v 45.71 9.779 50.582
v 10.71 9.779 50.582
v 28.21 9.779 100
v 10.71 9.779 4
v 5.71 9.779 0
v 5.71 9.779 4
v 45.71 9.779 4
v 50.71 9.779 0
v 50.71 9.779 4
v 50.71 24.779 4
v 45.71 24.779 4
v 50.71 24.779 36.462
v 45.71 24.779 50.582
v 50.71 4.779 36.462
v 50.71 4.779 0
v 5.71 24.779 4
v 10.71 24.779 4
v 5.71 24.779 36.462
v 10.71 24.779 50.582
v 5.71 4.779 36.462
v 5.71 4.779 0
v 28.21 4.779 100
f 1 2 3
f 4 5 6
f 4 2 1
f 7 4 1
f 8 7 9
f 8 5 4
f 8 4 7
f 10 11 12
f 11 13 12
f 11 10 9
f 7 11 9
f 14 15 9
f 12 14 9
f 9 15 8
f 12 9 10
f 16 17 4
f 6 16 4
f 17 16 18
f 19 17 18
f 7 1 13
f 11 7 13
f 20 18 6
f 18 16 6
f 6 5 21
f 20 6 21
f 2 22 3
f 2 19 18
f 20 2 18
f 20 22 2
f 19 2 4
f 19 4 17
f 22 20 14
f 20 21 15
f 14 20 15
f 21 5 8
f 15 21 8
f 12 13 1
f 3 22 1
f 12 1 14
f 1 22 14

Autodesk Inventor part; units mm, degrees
ref_plane "YZ Plane" through (0, 0, 0) normal (1, 0, 0) x (0, 1, 0)
ref_plane "XZ Plane" through (0, 0, 0) normal (0, 1, 0) x (-1, 0, 0)
ref_plane "XY Plane" through (0, 0, 0) normal (0, 0, 1) x (1, 0, 0)
sketch "Sketch1" plane through (0, 0, 0) normal (0, 0, 1) x (1, 0, 0)
  line L0 (10.7104, 9.7791) -> (45.7104, 9.7791)
  line L1 (45.7104, 9.7791) -> (45.7104, 24.7791)
  line L2 (10.7104, 9.7791) -> (10.7104, 24.7791)
  line L3 (5.7104, 24.7791) -> (5.7104, 4.7791)
  line L4 (5.7104, 4.7791) -> (50.7104, 4.7791)
  line L5 (50.7104, 4.7791) -> (50.7104, 24.7791)
  line L6 (5.7104, 24.7791) -> (10.7104, 24.7791)
  line L7 (45.7104, 24.7791) -> (50.7104, 24.7791)
  point P0 (0, 0)
  point P1 (28.2104, 9.7791)
  dimension "d0" = 35
  dimension "d1" = 15
  dimension "d2" = 15
  dimension "d29" = 5
extrude "Extrusion1" add sketch "Sketch1" along normal blind 100
sketch "Sketch3" plane through (10.7104, 9.7791, 0) normal (0, 1, 0) x (1, 0, 0)
  line L0 (-5, -100) -> (40, -100) projected
  line L1 (-5, 0) -> (-5, -100) projected
  line L2 (17.5, -100) -> (37.1919, -100) construction
  line L3 (-5, -85.7353) -> (-5, -100)
  line L4 (-5, -100) -> (17.5, -100)
  line L5 (40, 0) -> (40, -100) projected
  line L6 (17.5, -100) -> (37.1919, -100) construction
  line L7 (40, -85.7353) -> (40, -100)
  line L8 (40, -100) -> (17.5, -100)
  line L9 (40, 0) -> (40, -100) projected
  line L10 (17.5, -100) -> (-5, -36.462)
  line L11 (17.5, -100) -> (40, -36.462)
  line L12 (-5, -36.462) -> (40, -36.462)
  line L13 (35, 0) -> (35, -100) projected
  line L14 (0, 0) -> (0, -100) projected
  point P0 (-10.7104, 0)
  point P1 (-5, -77.7514)
  point P2 (40, -36.462)
  point P3 (-5, -60.8533)
  dimension "d33" = 39
extrude "Extrusion5" cut sketch "Sketch3" along normal through all both and the other way through all contours L1 L10 L14 L0 | L14 L10 L0 | L11 L13 L0 | L13 L11 L5 L0
sketch "Sketch4" plane through (50.7104, 4.7791, 0) normal (1, 0, 0) x (0, 0, -1)
  line L0 (0, 20) -> (-50.5815, 20) projected
  line L1 (0, 20) -> (-4, 20)
  line L2 (-4, 20) -> (-4, 5)
  line L3 (0, 5) -> (-50.5815, 5) projected
  line L4 (0, 20) -> (0, 5) projected
  line L5 (0, 5) -> (0, 20)
  line L6 (0, 20) -> (0, 5)
  line L7 (-4, 5) -> (0, 5)
  point P0 (0, -4.7791)
  dimension "d24" = 4
extrude "Extrusion6" cut sketch "Sketch4" against normal through all
equation "\"BendRadius\" = Thickness"
equation "\"BendReliefWidth\" = Thickness"
equation "\"BendReliefDepth\" = 0.5 * Thickness"
equation "\"CornerReliefSize\" = 4 * Thickness"
equation "\"MinimumRemnant\" = 2 * Thickness"
equation "\"TransitionRadius\" = BendRadius"
equation "\"JacobiRadiusSize\" = BendRadius"
equation "\"GapSize\" = Thickness"
equation "\"Thickness\" = 0.5"
properties part number "middleslide2"
